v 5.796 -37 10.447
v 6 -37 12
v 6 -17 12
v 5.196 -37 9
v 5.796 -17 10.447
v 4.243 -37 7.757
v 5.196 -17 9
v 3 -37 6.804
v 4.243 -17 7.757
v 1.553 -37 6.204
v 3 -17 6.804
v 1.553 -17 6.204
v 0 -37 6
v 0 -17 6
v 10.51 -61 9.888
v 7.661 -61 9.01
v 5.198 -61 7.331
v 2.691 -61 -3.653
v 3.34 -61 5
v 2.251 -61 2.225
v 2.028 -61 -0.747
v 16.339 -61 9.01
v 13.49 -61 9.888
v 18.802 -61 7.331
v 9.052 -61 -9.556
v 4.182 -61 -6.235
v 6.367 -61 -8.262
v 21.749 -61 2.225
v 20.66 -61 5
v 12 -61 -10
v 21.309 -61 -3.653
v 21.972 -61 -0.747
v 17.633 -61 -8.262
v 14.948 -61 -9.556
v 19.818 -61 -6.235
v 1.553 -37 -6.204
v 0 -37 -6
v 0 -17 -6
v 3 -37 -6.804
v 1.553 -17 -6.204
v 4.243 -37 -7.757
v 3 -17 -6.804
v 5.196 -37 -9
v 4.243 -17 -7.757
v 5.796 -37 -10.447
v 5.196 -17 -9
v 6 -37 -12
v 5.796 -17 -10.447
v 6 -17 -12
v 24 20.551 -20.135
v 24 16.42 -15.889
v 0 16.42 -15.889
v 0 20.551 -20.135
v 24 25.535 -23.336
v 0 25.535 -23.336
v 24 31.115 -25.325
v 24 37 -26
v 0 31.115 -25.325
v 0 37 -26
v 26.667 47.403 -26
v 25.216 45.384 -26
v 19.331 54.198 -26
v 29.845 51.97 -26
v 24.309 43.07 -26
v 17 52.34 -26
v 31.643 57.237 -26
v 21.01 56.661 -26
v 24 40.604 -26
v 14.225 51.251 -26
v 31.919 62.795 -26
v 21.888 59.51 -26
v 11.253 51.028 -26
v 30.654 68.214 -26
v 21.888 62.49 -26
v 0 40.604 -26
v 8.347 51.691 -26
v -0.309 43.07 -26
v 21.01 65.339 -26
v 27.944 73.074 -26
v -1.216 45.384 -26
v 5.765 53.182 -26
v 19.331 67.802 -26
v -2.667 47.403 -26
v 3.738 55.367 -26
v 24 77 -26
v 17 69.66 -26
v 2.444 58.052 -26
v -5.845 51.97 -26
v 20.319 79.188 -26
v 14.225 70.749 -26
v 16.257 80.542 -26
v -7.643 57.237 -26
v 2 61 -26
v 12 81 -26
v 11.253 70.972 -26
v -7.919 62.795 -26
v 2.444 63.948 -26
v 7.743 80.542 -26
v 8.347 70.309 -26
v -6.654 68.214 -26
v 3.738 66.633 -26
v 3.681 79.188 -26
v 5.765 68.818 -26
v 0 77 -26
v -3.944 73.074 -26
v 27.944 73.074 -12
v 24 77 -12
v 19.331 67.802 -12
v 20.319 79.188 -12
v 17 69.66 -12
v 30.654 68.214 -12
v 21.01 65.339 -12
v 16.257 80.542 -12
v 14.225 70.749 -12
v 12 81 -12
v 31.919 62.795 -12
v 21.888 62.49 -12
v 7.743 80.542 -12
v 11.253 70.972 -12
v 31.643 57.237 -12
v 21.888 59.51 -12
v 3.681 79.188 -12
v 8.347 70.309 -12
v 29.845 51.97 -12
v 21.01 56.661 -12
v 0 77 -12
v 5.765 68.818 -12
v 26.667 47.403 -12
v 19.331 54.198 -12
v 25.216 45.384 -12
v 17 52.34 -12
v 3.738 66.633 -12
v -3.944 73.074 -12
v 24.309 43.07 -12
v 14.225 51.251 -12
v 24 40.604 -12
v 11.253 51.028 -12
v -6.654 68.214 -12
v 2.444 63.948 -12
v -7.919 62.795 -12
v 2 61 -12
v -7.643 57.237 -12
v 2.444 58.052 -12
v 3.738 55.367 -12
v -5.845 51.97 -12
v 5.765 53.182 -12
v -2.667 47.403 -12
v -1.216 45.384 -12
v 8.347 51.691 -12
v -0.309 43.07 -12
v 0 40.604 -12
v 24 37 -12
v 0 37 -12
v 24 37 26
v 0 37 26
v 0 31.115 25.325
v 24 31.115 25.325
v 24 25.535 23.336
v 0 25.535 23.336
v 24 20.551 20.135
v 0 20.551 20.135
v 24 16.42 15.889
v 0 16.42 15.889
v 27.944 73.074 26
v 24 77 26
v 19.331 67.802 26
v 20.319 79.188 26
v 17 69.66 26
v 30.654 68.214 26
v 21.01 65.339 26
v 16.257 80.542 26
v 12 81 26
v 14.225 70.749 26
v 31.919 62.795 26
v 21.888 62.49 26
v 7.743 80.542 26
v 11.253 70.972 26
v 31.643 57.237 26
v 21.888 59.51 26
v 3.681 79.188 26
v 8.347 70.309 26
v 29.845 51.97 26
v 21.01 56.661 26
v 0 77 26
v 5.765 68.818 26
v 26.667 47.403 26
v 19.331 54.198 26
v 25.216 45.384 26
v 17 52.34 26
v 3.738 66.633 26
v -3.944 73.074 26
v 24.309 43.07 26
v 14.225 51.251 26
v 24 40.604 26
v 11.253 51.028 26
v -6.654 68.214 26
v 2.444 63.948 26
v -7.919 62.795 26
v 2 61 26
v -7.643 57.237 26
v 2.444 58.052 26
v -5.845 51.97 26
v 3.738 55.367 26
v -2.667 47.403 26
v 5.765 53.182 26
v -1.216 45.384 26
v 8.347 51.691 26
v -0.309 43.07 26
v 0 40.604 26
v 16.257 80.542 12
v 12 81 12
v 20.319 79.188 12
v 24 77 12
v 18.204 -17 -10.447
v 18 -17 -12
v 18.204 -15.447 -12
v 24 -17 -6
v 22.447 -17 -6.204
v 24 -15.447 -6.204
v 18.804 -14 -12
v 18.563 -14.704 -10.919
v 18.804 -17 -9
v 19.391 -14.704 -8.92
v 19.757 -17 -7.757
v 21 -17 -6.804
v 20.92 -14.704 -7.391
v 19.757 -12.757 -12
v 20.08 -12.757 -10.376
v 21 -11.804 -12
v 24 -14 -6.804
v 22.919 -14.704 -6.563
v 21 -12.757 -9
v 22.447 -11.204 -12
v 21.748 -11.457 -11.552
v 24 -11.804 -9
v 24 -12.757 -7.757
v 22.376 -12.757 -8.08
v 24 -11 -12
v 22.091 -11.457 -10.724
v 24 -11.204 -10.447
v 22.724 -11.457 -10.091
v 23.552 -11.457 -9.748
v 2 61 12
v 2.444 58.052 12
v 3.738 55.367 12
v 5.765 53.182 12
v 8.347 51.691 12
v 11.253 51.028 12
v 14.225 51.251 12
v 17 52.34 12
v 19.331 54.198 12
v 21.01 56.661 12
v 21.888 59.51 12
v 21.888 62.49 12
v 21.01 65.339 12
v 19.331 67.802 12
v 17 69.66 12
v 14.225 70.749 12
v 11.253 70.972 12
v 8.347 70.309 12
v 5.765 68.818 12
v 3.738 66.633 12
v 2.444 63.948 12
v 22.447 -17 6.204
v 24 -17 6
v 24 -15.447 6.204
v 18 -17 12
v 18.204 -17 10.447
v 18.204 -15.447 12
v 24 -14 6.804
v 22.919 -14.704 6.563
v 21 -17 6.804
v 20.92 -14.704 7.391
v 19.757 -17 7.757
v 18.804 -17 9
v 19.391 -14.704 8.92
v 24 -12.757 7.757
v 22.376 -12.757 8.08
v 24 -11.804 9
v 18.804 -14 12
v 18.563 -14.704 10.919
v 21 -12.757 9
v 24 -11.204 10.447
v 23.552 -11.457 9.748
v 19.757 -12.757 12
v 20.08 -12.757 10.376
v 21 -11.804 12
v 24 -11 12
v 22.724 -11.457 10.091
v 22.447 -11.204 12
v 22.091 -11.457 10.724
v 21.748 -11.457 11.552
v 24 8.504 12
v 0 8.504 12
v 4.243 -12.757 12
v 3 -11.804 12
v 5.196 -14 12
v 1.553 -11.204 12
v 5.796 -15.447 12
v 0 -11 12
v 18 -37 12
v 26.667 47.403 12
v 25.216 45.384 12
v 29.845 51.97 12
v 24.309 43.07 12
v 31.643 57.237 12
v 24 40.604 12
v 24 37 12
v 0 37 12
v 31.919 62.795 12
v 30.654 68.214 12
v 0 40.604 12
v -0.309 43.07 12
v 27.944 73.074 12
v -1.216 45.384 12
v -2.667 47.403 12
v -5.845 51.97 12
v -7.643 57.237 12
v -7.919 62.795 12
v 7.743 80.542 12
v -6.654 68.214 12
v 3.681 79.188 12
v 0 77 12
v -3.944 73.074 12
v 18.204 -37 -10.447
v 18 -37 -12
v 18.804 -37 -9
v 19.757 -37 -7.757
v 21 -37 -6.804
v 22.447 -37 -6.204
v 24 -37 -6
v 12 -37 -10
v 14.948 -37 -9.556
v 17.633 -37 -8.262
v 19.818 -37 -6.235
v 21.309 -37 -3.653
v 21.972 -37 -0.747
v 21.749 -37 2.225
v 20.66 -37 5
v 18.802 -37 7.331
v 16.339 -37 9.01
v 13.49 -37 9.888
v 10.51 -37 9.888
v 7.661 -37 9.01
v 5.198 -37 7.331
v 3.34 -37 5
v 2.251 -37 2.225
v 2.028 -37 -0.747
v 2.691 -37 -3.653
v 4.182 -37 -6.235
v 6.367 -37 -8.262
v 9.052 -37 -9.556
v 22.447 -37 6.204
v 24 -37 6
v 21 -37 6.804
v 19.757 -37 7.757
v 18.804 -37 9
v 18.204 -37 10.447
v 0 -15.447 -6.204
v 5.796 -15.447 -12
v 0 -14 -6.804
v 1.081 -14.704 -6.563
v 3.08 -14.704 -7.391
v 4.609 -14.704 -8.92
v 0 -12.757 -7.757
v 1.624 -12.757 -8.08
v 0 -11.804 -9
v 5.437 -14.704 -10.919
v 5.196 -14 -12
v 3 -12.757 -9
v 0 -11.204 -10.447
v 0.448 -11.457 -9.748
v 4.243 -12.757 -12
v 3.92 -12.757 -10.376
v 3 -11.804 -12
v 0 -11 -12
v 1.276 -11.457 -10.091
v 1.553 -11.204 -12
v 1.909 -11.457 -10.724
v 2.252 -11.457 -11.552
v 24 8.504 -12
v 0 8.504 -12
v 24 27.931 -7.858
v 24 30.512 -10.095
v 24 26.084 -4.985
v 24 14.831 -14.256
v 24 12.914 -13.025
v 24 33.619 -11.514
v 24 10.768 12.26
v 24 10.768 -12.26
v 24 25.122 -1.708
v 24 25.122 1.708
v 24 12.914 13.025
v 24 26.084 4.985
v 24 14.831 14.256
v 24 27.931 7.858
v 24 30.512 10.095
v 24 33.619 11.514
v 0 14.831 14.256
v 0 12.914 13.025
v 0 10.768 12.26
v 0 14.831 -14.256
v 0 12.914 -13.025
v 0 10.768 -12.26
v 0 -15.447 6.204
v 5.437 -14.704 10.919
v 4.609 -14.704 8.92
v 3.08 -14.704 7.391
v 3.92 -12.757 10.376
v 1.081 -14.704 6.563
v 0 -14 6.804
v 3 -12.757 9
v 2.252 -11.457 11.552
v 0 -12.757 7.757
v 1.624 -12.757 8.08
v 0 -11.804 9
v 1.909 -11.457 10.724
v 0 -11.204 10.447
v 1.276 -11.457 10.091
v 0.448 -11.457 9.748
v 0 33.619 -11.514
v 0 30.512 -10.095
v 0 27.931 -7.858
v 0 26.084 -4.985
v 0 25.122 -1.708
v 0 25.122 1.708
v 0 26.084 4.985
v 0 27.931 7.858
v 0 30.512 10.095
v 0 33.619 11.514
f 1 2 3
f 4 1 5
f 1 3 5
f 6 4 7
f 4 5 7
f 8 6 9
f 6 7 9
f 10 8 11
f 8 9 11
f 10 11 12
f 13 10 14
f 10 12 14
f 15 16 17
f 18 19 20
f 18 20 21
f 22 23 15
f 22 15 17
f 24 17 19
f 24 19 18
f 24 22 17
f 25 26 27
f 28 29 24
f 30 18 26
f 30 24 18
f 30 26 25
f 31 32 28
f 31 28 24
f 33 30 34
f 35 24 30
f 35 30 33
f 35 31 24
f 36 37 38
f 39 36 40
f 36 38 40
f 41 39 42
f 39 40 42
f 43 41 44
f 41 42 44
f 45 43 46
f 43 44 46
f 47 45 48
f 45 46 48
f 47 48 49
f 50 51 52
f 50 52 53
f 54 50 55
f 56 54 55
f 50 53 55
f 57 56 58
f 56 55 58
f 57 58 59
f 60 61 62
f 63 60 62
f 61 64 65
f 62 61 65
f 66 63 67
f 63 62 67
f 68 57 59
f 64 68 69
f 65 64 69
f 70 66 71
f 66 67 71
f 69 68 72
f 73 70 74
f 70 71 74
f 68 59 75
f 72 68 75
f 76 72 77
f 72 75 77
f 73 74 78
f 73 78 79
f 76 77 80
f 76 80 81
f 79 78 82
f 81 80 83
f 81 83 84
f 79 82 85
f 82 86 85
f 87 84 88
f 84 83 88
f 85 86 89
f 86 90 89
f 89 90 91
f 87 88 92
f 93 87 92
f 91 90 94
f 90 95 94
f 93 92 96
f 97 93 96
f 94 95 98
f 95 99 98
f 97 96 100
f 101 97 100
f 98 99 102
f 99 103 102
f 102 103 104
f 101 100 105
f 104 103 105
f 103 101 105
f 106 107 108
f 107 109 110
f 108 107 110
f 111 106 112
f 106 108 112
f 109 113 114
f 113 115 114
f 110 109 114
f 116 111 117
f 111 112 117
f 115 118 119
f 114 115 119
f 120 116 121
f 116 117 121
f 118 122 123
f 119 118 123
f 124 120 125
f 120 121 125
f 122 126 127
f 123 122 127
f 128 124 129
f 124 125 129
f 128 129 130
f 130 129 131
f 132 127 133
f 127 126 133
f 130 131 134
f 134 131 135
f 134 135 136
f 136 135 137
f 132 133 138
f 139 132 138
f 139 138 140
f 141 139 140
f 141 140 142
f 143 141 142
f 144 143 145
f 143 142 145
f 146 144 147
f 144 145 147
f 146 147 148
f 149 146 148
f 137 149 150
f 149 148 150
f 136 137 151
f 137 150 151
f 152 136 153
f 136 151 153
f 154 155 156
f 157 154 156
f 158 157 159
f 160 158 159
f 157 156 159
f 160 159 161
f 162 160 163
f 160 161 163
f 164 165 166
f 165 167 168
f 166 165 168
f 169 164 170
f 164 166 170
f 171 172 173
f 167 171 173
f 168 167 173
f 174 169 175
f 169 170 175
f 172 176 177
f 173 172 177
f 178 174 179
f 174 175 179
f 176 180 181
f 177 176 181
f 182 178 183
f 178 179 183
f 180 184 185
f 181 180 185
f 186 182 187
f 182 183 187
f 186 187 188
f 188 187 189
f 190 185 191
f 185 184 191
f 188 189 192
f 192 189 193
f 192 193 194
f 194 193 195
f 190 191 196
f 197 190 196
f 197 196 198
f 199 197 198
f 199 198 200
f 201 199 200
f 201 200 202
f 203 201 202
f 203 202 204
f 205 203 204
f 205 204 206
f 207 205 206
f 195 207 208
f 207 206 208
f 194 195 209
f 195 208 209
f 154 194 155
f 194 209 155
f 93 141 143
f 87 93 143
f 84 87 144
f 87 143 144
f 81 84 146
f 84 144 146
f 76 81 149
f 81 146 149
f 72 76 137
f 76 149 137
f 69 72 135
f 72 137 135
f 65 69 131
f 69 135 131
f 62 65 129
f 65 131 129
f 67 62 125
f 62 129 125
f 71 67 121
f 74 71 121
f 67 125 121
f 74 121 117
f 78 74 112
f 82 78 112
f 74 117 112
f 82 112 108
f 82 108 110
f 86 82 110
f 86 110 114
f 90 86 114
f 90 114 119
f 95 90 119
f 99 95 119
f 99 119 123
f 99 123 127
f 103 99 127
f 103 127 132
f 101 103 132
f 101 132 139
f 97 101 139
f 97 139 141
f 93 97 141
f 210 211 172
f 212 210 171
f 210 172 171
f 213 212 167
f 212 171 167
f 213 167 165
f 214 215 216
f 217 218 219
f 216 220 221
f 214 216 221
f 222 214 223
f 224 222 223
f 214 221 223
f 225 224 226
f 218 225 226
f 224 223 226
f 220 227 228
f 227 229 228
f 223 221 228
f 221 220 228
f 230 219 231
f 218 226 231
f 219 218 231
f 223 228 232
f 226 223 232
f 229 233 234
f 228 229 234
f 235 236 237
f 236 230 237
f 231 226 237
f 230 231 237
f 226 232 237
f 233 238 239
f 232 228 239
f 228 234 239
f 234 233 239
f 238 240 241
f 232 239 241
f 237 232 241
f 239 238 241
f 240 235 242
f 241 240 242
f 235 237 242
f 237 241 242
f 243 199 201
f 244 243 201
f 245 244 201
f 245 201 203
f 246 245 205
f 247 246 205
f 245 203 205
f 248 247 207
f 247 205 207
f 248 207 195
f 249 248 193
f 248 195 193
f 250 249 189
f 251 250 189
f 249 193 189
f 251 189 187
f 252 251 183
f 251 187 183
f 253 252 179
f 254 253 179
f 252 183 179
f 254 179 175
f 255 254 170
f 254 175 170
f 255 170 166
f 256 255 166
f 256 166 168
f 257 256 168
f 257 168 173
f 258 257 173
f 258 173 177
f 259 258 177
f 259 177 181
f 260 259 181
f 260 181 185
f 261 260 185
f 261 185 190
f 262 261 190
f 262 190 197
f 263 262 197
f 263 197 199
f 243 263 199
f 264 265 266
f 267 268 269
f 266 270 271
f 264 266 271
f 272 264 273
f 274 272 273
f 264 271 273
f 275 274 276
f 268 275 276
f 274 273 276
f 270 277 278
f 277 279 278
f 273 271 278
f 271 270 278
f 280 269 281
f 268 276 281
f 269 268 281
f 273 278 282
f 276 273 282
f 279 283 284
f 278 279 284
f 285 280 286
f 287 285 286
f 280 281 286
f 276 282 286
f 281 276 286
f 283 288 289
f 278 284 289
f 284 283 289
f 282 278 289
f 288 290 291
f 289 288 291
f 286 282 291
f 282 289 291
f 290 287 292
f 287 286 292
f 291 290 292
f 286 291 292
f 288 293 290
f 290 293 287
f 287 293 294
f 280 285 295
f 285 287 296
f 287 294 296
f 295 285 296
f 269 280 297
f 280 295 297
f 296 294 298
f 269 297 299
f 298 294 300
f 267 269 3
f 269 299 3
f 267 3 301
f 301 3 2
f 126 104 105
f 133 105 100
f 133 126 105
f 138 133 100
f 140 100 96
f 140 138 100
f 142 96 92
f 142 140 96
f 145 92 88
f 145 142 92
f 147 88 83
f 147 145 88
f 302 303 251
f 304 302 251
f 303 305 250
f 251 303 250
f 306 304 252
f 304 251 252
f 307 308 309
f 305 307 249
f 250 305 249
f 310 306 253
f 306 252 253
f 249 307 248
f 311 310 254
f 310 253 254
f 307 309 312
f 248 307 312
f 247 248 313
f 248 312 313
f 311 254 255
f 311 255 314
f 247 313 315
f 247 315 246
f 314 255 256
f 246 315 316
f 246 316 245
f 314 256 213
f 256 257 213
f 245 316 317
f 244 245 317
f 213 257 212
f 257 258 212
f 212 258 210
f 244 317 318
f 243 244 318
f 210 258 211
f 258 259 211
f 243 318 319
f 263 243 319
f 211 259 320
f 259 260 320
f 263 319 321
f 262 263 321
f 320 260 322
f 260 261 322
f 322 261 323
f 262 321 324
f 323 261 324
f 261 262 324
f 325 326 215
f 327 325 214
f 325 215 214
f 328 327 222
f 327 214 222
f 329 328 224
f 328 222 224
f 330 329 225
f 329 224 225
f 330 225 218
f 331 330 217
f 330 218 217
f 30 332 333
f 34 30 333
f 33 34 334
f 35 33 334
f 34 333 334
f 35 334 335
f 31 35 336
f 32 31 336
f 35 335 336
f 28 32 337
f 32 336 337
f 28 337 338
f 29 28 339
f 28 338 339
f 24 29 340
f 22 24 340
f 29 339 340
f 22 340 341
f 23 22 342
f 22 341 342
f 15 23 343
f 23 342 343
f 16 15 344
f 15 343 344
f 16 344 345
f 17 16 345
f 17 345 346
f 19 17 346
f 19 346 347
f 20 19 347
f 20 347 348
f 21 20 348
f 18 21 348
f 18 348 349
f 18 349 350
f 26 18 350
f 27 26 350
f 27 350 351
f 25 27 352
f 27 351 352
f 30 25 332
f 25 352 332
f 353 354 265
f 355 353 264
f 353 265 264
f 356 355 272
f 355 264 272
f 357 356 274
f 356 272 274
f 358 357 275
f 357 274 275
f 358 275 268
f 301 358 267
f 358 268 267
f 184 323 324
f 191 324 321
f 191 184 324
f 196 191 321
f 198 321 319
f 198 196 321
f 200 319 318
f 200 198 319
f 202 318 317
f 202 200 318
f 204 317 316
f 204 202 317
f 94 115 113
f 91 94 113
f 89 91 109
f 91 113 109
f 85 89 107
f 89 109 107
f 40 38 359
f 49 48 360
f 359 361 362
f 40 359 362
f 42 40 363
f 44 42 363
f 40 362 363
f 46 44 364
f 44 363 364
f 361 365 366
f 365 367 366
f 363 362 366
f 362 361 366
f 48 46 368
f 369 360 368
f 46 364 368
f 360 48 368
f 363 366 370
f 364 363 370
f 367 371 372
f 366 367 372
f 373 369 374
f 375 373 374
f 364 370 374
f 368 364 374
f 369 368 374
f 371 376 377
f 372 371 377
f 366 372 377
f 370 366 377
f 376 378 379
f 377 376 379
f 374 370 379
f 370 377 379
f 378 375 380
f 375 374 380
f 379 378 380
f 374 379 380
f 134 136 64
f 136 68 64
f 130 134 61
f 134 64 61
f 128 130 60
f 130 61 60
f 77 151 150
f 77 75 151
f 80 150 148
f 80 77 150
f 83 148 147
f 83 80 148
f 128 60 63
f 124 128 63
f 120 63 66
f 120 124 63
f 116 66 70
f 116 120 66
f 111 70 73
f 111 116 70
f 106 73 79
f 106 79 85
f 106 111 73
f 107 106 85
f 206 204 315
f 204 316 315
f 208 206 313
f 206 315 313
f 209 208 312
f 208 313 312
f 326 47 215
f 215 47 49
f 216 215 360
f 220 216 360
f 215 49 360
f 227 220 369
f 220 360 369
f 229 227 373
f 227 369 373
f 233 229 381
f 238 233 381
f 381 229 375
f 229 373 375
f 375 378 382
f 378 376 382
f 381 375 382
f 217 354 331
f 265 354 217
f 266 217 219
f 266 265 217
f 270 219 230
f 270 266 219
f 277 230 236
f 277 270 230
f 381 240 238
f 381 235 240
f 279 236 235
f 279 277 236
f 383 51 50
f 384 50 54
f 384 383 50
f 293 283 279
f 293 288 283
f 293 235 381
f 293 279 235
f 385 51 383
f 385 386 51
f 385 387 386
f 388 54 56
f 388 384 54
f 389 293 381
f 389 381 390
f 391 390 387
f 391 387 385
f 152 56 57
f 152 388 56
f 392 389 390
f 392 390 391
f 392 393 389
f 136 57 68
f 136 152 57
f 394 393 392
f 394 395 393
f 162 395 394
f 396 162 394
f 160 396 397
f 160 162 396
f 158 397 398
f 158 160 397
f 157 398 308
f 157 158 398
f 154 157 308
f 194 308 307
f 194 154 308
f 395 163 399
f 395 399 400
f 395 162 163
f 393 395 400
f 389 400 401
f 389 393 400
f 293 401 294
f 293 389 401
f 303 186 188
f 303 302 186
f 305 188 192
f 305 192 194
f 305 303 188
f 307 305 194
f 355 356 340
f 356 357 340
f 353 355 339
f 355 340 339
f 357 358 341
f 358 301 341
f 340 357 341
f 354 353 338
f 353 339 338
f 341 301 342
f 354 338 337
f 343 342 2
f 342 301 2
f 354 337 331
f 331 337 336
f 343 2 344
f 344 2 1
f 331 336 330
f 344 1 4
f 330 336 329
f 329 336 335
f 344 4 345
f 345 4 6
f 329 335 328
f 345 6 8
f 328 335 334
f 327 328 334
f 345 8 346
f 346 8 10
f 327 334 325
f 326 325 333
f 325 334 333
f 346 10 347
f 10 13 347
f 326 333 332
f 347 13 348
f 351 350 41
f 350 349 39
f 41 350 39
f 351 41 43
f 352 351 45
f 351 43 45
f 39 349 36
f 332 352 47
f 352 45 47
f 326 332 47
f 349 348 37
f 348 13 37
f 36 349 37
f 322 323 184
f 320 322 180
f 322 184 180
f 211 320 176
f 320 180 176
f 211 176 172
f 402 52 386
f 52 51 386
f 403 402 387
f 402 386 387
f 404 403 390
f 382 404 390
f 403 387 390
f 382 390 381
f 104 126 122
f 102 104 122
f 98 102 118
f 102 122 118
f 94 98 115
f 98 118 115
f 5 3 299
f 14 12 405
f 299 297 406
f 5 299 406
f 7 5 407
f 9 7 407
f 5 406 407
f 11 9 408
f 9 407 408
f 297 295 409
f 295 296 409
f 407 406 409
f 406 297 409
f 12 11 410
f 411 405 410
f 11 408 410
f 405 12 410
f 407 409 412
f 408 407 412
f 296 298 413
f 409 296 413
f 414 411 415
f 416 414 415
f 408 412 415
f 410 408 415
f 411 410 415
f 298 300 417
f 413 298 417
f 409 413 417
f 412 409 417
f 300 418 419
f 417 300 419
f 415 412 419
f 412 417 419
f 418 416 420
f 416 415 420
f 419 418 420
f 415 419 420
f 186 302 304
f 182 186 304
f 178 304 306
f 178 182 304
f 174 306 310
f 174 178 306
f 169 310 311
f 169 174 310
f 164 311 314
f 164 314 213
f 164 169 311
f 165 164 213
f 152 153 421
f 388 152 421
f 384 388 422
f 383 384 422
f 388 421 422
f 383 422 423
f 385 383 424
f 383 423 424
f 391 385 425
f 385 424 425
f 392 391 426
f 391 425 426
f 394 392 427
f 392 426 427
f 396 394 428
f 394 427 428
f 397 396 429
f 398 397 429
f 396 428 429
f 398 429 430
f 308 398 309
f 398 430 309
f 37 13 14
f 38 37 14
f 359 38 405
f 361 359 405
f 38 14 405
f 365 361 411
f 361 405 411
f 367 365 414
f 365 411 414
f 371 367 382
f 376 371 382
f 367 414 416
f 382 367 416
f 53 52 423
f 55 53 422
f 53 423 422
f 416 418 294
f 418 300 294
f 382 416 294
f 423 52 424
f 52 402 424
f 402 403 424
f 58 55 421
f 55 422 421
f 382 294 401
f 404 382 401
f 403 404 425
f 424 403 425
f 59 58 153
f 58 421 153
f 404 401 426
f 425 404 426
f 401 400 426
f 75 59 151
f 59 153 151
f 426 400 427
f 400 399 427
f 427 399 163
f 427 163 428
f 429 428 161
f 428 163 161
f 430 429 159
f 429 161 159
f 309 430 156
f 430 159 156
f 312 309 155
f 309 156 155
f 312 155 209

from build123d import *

# Parameters (mm, degrees)
BOSS_EXTRUDE1_DEPTH = 24
SKETCH2_R           = 10
BOSS_EXTRUDE2_DEPTH = 24
CIRPATTERN1_COUNT   = 4
BOSS_EXTRUDE4_START = -38
BOSS_EXTRUDE4_DEPTH = 14
BOSS_EXTRUDE5_DEPTH = 14
CUT_EXTRUDE1_DEPTH  = 102.434708064
FILLET1_R           = 10
FILLET2_R           = 10


with BuildPart() as part:
    # Sketch1 → Boss-Extrude1 (new body)
    with BuildSketch(Plane.YZ):
        with BuildLine():
            Line((81, 12), (81, 26))
            Line((81, 26), (37, 26))
            ThreePointArc((37, 26), (23.509262437, 22.226110771), (13.934874811, 12))
            Line((13.934874811, 12), (-37, 12))
            Line((-37, 12), (-37, -12))
            Line((-37, -12), (13.934874811, -12))
            ThreePointArc((13.934874811, -12), (23.509262437, -22.226110771), (37, -26))
            Line((37, -26), (81, -26))
            Line((81, -26), (81, -12))
            Line((81, -12), (37, -12))
            ThreePointArc((37, -12), (25, 0), (37, 12))
            Line((37, 12), (81, 12))
        make_face()
    extrude(amount=BOSS_EXTRUDE1_DEPTH)

    # Sketch2 → Boss-Extrude2 (add)
    with BuildSketch(Plane.XZ.offset(37)):
        with Locations(Location((12, 0, 0), (0, 0, 270))):
            Circle(SKETCH2_R)
    extrude(amount=BOSS_EXTRUDE2_DEPTH)

    # Sketch3 → Cut-Revolve2 (revolve, cut)
    with BuildSketch(Plane.YZ.offset(24)):
        with BuildLine():
            Line((-37, 12), (-37, 6))
            Line((-37, 6), (-17, 6))
            ThreePointArc((-17, 6), (-12.757359313, 7.757359313), (-11, 12))
            Line((-11, 12), (-37, 12))
        make_face()
    cut_revolve2 = revolve(axis=Axis((24, 13.934874811, 12), (0, 1, 0)), mode=Mode.SUBTRACT)

    # CirPattern1: Cut-Revolve2 ×4 about axis
    cirpattern1_axis = Axis((12, 0, 0), (0, 1, 0))
    for i in range(1, CIRPATTERN1_COUNT):
        add(cut_revolve2.rotate(cirpattern1_axis, i * 360 / CIRPATTERN1_COUNT), mode=Mode.SUBTRACT)

    # Sketch4 → Boss-Extrude4 (add, through all)
    with BuildSketch(Plane.XY.offset(26).offset(BOSS_EXTRUDE4_START)):
        with BuildLine():
            Line((24, 61), (24, 45))
            ThreePointArc((24, 45), (29.88854382, 52.05572809), (32, 61))
            ThreePointArc((32, 61), (29.88854382, 69.94427191), (24, 77))
            Line((24, 77), (24, 61))
        make_face()
        with BuildLine():
            Line((0, 45), (0, 61))
            Line((0, 61), (0, 77))
            ThreePointArc((0, 77), (-8, 61), (0, 45))
        make_face()
    extrude(amount=-BOSS_EXTRUDE4_DEPTH)

    # Sketch4<3> → Boss-Extrude5 (add)
    with BuildSketch(Plane.XY.offset(26)):
        with BuildLine():
            Line((24, 61), (24, 45))
            ThreePointArc((24, 45), (29.88854382, 52.05572809), (32, 61))
            ThreePointArc((32, 61), (29.88854382, 69.94427191), (24, 77))
            Line((24, 77), (24, 61))
        make_face()
        with BuildLine():
            Line((0, 45), (0, 61))
            Line((0, 61), (0, 77))
            ThreePointArc((0, 77), (-8, 61), (0, 45))
        make_face()
    extrude(amount=-BOSS_EXTRUDE5_DEPTH)

    # Sketch4<4> → Cut-Extrude1 (cut, through all)
    with BuildSketch(Plane.XY.offset(26)):
        with BuildLine():
            Line((24, 81), (12, 81))
            ThreePointArc((12, 81), (18.32455532, 79.973665961), (24, 77))
            Line((24, 77), (24, 81))
        make_face()
        with BuildLine():
            Line((0, 81), (0, 77))
            ThreePointArc((0, 77), (5.67544468, 79.973665961), (12, 81))
            Line((12, 81), (0, 81))
        make_face()
        with BuildLine():
            ThreePointArc((22, 61), (12, 71), (2, 61))
            Line((2, 61), (12, 61))
            Line((12, 61), (22, 61))
        make_face()
        with BuildLine():
            Line((12, 61), (2, 61))
            ThreePointArc((2, 61), (12, 51), (22, 61))
            Line((22, 61), (12, 61))
        make_face()
    extrude(amount=-CUT_EXTRUDE1_DEPTH, mode=Mode.SUBTRACT)

    # Fillet1
    fillet1_edges = [part.edges().sort_by_distance(p)[0] for p in [
        (24, 45, -19),
        (0, 45, -19),
        (24, 45, 19),
        (0, 45, 19),
    ]]
    fillet(fillet1_edges, radius=FILLET1_R)

    # Fillet2
    fillet2_edges = [part.edges().sort_by_distance(p)[0] for p in [
        (12, 13.934874811, -12),
        (12, 13.934874811, 12),
    ]]
    fillet(fillet2_edges, radius=FILLET2_R)


solid = part.part
